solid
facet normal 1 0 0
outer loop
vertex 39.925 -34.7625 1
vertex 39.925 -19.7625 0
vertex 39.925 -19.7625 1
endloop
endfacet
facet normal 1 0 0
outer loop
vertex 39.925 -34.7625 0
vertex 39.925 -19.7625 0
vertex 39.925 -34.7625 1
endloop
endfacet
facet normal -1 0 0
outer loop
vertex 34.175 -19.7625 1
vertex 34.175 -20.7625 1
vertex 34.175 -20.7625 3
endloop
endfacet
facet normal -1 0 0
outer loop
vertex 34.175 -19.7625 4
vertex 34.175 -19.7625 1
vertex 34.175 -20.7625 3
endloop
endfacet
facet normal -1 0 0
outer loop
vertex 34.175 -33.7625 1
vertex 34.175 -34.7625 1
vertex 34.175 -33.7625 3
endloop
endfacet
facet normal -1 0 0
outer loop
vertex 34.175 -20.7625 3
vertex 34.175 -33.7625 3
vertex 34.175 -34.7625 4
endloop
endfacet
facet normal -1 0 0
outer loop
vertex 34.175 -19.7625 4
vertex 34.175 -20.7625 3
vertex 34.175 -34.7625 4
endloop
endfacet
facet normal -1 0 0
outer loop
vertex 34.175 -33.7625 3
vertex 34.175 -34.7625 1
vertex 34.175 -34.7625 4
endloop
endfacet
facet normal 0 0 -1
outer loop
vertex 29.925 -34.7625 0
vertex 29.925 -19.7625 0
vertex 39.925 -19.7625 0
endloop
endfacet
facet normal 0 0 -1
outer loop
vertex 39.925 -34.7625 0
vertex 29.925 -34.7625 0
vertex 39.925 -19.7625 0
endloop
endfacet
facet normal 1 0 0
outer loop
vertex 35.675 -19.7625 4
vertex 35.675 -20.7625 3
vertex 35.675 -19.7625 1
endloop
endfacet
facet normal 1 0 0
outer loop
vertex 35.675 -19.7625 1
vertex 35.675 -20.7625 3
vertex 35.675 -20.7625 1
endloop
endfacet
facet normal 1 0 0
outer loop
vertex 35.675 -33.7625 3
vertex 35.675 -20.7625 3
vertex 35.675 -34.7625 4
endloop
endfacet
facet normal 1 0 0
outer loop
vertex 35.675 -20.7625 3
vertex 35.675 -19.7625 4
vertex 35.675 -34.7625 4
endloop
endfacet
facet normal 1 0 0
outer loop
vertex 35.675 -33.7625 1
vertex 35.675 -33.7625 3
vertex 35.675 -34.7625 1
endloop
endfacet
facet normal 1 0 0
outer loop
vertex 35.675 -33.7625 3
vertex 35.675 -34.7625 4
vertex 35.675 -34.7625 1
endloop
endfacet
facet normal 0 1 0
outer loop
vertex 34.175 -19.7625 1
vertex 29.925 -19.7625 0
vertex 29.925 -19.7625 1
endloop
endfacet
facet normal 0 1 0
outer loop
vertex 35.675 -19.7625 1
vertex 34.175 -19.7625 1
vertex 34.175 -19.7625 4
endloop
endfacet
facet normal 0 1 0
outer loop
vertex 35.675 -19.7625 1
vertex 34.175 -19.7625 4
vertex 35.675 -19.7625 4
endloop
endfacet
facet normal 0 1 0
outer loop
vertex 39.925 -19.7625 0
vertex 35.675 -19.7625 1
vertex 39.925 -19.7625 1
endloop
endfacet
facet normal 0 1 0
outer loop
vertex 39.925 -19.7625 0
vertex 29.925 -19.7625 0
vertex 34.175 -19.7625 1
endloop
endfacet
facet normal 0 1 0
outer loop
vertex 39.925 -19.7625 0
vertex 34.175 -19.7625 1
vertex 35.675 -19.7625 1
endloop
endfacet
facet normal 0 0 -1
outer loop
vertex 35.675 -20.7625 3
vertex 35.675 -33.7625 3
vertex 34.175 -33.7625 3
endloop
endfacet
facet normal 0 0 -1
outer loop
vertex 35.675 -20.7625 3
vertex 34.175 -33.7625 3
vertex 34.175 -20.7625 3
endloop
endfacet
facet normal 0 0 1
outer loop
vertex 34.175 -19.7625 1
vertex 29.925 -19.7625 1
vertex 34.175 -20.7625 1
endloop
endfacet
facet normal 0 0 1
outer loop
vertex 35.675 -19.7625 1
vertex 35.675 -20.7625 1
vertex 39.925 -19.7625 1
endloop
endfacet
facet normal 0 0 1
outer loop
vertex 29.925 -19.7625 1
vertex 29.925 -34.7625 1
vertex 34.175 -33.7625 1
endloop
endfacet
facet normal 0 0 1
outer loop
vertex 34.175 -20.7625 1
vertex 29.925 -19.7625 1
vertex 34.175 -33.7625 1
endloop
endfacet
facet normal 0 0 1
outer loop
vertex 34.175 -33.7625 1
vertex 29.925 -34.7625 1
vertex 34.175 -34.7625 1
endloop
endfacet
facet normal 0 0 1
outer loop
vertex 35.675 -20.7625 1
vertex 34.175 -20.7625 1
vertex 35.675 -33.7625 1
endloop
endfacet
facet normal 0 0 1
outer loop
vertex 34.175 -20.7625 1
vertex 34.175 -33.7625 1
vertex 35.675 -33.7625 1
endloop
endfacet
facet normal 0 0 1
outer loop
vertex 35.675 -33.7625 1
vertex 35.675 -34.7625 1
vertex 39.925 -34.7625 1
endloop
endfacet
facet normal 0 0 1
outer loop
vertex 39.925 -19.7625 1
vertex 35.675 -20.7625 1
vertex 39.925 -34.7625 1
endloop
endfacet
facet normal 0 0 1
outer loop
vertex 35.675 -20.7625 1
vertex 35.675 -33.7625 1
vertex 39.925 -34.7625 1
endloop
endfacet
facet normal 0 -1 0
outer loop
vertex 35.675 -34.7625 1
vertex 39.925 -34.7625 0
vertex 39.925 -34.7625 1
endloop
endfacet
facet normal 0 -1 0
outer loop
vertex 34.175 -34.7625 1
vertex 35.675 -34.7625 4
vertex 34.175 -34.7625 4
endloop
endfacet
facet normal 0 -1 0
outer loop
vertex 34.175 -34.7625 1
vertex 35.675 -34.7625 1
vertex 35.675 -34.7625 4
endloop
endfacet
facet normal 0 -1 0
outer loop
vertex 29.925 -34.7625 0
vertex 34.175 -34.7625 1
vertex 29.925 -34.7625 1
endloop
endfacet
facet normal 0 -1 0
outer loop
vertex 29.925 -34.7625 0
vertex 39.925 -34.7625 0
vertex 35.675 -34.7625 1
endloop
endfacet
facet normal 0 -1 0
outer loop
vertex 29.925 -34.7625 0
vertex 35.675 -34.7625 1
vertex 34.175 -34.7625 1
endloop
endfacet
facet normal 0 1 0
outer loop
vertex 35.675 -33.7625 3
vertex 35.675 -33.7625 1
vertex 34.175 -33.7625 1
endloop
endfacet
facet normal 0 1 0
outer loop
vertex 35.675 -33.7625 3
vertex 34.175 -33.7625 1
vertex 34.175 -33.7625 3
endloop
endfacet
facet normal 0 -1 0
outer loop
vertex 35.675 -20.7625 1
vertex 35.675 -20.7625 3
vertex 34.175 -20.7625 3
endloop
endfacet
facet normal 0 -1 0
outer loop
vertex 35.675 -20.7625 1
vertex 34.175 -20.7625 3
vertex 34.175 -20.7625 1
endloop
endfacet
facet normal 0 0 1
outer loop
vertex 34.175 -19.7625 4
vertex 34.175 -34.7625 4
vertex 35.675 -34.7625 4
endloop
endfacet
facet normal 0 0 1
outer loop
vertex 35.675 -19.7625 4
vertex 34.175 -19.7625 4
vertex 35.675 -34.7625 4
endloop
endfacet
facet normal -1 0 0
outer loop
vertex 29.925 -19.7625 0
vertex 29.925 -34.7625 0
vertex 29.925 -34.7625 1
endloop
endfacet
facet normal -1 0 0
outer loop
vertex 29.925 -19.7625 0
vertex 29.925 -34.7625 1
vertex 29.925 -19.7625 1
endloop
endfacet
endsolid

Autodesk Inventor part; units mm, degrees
ref_plane "YZ Plane" through (0, 0, 0) normal (1, 0, 0) x (0, 1, 0)
ref_plane "XZ Plane" through (0, 0, 0) normal (0, 1, 0) x (-1, 0, 0)
ref_plane "XY Plane" through (0, 0, 0) normal (0, 0, 1) x (1, 0, 0)
sketch "Эскиз1" plane through (0, 0, 0) normal (0, 0, 1) x (1, 0, 0)
  line L0 (29.925, -19.7625) -> (39.925, -19.7625)
  line L1 (39.925, -19.7625) -> (39.925, -34.7625)
  line L2 (39.925, -34.7625) -> (29.925, -34.7625)
  line L3 (29.925, -34.7625) -> (29.925, -19.7625)
  point P0 (0, 0)
  dimension "d0" = 15
  dimension "d1" = 10
extrude "Выдавливание1" add sketch "Эскиз1" along normal blind 5
sketch "Эскиз2" plane through (29.925, -34.7625, 0) normal (0, -1, 0) x (1, 0, 0)
  line L0 (0, 0) -> (0, 5) projected
  line L1 (0, 1) -> (4.25, 1)
  line L2 (4.25, 1) -> (4.25, 4)
  line L3 (4.25, 4) -> (5.75, 4)
  line L4 (5.75, 4) -> (5.75, 1)
  line L5 (5.75, 1) -> (10, 1)
  line L6 (10, 0) -> (10, 5) projected
  line L7 (0, 5) -> (10, 5) projected
  line L8 (0, 0) -> (10, 0) projected
  point P0 (-29.925, 0)
  dimension "d4" = 1.5
  dimension "d5" = 4.25
  dimension "d6" = 10
  dimension "d7" = 1
  dimension "d8" = 1
extrude "Выдавливание2" cut sketch "Эскиз2" against normal through all contours L0 L1 L2 L3 L4 L5 L6 L8 keep common part
sketch "Эскиз3" plane through (35.675, -34.7625, 4) normal (1, 0, 0) x (0, 0, -1)
  line L0 (3, 15) -> (0, 15) projected
  line L1 (0, 0) -> (0, 15) projected
  line L2 (0, 0) -> (3, 0) projected
  line L3 (3, 0) -> (3, 15) projected
  line L4 (3, 0) -> (3, 15) projected
  line L5 (3, 1) -> (1, 1)
  line L6 (1, 1) -> (1, 14)
  line L7 (1, 14) -> (3, 14)
  line L8 (3, 14) -> (3, 1)
  point P0 (4, 34.7625)
  point P1 (3, 1)
  dimension "d11" = 1
  dimension "d12" = 1
  dimension "d13" = 1
extrude "Выдавливание3" cut sketch "Эскиз3" against normal through all contours L3 L5 L6 L7
equation "\"d5\" = -0.5 * d4 + 0.5 * d6"
properties part number "Клемники винтовые"
